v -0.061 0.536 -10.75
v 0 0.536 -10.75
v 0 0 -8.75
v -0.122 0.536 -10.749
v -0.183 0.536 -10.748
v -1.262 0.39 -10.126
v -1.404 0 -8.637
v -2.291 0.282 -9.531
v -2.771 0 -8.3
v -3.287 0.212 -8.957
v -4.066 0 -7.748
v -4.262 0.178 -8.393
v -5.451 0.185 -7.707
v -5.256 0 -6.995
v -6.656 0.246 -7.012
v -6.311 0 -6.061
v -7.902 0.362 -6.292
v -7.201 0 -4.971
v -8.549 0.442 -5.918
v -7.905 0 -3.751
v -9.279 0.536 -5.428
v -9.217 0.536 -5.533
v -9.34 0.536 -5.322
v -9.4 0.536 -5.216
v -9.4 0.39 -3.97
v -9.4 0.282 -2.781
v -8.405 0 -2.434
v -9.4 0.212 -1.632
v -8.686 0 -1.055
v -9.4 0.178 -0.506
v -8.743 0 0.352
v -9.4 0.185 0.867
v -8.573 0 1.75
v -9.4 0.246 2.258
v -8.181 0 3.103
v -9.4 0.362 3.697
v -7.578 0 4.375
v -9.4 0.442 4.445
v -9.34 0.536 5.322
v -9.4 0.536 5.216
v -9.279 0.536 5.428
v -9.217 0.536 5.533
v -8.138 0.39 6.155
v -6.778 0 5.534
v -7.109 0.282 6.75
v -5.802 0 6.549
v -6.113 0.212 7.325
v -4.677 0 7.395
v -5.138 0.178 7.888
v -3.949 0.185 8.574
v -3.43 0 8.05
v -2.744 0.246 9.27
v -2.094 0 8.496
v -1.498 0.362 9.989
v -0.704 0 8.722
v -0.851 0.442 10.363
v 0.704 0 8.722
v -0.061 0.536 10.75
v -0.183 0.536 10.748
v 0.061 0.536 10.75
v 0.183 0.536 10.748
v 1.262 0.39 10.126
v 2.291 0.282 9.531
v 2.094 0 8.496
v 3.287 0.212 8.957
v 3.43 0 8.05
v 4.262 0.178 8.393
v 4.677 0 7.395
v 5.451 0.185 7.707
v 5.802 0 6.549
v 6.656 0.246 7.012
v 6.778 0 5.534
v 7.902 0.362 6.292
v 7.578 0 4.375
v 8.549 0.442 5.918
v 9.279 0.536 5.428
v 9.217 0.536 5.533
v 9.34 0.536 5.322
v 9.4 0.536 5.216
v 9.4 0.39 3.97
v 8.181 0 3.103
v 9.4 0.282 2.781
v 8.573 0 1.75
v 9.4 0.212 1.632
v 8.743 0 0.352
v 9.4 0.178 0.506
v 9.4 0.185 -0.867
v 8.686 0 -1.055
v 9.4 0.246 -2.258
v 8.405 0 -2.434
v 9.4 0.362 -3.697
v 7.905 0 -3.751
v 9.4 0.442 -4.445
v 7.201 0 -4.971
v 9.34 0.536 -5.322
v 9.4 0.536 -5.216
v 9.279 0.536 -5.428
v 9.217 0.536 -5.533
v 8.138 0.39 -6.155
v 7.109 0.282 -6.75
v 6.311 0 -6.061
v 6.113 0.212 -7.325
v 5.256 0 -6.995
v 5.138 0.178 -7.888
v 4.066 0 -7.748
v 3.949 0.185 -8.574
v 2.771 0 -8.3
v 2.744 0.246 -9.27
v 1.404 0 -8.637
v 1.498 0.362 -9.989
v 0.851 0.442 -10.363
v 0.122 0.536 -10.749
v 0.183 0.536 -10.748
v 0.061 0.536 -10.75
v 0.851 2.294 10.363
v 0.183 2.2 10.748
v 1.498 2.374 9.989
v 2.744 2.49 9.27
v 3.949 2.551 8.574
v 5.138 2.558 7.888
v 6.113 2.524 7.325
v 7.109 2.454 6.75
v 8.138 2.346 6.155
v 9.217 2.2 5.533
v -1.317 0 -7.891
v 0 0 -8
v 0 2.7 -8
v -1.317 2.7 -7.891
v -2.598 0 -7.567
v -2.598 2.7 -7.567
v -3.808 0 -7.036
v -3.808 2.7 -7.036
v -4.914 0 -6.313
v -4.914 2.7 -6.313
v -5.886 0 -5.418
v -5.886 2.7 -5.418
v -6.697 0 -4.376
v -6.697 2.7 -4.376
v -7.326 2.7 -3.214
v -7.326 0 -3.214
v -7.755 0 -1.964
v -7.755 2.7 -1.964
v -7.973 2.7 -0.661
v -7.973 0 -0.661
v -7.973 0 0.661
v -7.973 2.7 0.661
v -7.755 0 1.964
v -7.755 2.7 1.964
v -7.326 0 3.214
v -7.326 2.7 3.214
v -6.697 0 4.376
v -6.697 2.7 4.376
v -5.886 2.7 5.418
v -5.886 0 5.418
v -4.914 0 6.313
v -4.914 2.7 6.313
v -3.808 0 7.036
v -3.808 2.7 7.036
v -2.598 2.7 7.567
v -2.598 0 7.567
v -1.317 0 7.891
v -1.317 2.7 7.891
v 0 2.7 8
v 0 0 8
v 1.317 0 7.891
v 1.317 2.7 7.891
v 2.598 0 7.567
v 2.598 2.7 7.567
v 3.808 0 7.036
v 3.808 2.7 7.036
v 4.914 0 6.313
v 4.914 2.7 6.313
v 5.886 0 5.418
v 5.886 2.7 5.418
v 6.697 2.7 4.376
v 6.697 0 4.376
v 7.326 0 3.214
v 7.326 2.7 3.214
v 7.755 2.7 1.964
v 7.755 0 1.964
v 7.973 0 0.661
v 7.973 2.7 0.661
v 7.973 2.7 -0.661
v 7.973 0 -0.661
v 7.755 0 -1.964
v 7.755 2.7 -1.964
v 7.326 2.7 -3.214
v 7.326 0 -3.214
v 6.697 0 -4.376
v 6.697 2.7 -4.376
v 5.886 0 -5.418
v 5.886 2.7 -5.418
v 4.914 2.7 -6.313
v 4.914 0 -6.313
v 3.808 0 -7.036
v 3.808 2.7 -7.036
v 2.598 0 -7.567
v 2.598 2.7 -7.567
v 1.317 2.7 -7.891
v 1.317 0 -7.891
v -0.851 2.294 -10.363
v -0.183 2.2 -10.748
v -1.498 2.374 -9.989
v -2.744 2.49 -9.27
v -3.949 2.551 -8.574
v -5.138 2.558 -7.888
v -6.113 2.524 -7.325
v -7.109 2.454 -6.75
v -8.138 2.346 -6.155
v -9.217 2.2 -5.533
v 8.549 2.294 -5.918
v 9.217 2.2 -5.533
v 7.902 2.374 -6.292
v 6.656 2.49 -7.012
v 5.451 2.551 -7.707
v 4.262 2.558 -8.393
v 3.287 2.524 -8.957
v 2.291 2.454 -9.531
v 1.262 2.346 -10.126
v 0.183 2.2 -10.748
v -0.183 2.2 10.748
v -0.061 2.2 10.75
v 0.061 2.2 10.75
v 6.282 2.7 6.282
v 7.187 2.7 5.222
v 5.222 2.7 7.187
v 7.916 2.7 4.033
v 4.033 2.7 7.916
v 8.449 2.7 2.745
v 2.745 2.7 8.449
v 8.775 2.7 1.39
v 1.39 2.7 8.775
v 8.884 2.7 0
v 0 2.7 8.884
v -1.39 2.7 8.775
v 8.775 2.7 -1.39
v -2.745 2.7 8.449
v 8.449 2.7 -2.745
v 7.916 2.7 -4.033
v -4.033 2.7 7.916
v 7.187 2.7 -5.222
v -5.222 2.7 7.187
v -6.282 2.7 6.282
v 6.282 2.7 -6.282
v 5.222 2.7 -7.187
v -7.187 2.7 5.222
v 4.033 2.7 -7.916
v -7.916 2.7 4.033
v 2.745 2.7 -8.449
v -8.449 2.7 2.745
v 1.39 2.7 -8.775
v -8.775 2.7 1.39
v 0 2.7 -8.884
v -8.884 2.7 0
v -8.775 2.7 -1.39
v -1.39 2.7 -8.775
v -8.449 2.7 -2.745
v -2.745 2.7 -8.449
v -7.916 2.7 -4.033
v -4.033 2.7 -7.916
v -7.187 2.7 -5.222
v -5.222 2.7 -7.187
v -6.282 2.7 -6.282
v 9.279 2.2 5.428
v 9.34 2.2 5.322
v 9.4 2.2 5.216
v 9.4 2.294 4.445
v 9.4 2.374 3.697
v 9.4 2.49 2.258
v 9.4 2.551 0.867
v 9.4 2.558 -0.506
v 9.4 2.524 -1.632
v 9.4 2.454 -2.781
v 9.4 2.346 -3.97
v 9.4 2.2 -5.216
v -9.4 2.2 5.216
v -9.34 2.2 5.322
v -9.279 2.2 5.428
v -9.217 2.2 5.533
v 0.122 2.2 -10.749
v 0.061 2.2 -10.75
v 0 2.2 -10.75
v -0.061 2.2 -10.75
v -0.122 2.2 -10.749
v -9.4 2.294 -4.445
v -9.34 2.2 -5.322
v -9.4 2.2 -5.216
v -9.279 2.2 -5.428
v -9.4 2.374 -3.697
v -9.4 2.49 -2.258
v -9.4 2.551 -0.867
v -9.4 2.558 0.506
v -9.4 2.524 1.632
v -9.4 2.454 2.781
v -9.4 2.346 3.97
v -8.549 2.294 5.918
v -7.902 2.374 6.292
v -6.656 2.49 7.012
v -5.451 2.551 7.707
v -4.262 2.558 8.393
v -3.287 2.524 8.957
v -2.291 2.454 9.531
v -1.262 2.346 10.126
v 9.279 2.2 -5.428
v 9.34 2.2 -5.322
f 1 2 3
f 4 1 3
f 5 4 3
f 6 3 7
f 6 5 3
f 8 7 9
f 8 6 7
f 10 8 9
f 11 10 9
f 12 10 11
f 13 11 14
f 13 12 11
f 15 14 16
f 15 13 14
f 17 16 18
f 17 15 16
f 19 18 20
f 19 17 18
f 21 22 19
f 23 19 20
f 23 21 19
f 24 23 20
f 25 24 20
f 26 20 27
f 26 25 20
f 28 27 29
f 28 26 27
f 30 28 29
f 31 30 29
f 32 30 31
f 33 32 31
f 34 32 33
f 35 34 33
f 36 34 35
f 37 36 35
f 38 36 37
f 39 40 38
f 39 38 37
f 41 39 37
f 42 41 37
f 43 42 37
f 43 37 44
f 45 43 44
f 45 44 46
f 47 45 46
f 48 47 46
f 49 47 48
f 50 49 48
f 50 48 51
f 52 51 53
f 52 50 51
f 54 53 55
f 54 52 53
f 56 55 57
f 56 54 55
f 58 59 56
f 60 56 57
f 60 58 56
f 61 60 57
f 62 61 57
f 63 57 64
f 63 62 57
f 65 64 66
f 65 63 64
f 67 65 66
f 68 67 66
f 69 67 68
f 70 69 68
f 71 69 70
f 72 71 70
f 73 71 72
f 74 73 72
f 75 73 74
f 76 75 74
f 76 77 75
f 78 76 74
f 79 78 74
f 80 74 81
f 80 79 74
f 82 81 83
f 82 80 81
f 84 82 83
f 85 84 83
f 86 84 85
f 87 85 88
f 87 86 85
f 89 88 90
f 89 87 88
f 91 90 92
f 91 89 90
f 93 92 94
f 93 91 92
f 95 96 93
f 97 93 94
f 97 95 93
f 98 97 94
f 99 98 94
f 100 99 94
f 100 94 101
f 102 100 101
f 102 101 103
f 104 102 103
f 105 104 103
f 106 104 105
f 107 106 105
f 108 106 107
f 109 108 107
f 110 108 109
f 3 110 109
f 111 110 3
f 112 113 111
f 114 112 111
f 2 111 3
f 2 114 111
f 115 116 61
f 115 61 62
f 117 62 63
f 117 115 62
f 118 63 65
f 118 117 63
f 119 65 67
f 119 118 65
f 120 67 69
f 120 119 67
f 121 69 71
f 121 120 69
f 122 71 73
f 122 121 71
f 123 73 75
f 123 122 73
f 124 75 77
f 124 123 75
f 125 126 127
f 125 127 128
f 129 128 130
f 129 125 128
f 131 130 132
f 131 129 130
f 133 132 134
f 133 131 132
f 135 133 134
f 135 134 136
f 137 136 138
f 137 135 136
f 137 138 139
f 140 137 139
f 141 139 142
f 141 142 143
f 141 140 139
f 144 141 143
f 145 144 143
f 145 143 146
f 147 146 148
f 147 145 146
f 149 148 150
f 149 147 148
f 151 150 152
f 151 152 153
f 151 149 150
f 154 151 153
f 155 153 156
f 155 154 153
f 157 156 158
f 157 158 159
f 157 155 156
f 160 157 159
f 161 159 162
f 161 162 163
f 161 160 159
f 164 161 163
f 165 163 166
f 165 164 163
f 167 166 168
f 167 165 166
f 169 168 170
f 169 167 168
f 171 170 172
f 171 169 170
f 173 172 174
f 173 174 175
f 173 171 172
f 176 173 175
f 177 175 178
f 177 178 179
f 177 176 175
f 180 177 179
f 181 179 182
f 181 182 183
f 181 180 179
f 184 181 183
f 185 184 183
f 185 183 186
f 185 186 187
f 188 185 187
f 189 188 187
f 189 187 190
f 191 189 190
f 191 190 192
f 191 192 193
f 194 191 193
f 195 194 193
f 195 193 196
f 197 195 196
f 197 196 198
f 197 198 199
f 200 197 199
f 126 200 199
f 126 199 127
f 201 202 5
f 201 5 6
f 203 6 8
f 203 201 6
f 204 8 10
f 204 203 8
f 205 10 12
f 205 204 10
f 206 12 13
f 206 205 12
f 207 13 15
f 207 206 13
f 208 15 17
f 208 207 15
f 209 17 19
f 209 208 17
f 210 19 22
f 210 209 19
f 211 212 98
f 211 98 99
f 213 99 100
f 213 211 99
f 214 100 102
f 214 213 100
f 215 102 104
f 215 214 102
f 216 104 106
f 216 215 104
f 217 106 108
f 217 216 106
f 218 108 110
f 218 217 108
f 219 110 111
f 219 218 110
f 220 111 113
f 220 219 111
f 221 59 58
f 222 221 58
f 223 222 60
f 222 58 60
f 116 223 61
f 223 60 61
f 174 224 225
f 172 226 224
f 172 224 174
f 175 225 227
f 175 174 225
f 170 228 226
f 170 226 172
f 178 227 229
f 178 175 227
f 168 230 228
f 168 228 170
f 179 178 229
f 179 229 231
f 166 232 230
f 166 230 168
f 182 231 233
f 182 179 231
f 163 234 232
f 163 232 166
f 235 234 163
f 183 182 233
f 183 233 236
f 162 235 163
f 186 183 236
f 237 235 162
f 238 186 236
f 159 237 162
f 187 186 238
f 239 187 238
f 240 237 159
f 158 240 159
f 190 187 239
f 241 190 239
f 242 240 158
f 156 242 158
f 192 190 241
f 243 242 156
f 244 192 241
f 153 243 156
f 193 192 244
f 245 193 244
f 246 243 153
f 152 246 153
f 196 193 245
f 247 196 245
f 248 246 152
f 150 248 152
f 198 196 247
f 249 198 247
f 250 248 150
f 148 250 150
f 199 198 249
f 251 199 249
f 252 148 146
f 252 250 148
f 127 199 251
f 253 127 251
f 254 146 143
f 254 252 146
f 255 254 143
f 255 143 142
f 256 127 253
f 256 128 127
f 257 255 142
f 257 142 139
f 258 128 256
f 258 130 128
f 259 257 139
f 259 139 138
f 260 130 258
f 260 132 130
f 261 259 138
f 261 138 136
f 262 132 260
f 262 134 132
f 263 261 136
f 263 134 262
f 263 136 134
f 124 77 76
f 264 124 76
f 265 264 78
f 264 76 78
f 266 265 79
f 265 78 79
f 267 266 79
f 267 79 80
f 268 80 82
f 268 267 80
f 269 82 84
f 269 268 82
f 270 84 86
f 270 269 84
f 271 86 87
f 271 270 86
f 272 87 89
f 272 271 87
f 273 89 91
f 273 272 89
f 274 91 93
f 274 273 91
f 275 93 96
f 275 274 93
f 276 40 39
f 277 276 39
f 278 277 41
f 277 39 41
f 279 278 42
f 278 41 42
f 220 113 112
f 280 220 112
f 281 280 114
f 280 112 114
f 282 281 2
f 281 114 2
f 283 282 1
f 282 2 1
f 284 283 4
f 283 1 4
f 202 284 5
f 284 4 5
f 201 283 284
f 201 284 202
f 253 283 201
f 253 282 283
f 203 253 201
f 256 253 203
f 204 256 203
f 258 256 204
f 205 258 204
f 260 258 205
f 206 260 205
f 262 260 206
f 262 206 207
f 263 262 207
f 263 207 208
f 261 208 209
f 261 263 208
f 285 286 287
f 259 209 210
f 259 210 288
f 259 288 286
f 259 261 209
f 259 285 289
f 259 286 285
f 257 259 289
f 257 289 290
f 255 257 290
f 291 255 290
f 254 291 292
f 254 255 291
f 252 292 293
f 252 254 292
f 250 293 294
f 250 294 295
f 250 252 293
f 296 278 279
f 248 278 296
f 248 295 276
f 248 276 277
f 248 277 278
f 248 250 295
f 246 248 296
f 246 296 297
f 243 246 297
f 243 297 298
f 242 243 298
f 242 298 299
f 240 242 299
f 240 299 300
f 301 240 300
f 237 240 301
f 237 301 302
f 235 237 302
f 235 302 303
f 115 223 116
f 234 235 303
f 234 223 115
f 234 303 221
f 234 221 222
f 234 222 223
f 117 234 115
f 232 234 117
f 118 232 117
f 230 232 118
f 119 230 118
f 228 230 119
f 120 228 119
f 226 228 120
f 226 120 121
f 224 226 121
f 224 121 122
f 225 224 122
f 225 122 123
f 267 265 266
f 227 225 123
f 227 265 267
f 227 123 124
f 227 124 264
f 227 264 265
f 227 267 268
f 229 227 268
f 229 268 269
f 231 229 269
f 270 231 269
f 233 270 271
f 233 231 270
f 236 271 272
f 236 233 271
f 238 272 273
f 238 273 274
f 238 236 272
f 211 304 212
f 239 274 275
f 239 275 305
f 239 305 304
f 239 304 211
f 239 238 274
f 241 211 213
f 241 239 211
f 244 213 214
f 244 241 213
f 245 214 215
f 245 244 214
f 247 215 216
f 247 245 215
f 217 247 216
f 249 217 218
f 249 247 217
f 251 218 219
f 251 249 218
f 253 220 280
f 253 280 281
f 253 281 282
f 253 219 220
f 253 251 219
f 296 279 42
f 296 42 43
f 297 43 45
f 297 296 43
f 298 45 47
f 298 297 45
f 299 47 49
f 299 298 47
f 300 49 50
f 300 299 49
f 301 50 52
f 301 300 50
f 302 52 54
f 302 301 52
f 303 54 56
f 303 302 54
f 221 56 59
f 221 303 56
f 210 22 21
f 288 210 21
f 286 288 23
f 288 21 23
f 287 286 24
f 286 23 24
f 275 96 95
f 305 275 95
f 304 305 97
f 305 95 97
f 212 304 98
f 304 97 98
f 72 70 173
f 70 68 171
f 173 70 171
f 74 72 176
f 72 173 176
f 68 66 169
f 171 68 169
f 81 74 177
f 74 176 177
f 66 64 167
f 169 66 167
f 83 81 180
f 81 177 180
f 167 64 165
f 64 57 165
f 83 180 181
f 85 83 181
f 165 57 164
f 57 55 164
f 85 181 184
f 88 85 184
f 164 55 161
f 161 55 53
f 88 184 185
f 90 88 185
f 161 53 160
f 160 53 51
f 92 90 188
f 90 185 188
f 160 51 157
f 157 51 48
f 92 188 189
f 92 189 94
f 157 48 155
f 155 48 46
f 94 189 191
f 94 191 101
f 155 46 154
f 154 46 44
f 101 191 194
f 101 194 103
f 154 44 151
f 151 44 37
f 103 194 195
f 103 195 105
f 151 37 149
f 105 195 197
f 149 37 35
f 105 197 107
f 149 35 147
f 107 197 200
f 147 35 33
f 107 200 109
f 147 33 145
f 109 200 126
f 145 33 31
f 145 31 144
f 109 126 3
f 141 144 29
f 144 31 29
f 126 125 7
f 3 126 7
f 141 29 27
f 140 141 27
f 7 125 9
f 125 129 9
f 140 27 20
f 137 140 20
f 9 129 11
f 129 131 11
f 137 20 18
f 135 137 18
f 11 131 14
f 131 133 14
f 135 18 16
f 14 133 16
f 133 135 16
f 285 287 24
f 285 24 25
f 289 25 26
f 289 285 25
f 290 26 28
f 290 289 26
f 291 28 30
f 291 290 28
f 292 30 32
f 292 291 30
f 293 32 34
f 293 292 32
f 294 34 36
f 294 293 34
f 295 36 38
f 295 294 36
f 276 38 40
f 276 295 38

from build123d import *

# Parameters (mm, degrees)
SKETCH1_R           = 10.75
SKETCH1_R_2         = 8
BOSS_EXTRUDE1_DEPTH = 2.7
CHAMFER1_SIZE       = 0.5
CHAMFER1_SIZE2      = 1.866025404
CHAMFER2_SIZE       = 2
CHAMFER2_SIZE2      = 0.535898385
SKETCH3_OUTSIDE_W   = 29.606
SKETCH3_OUTSIDE_H   = 29.606
CUT_EXTRUDE1_DEPTH  = 2.7


with BuildPart() as part:
    # Sketch1 → Boss-Extrude1 (new body)
    with BuildSketch(Plane(origin=(0, 0, 0), x_dir=(1, 0, 0), z_dir=(0, 1, 0))):
        with Locations(Location((0, 0, 0), (0, 0, 90))):
            Circle(SKETCH1_R)
        with Locations(Location((0, 0, 0), (0, 0, 90))):
            Circle(SKETCH1_R_2, mode=Mode.SUBTRACT)
    extrude(amount=BOSS_EXTRUDE1_DEPTH)

    # Chamfer1
    chamfer1_edges = [part.edges().sort_by_distance(p)[0] for p in [
        (0, 2.7, 10.75),
    ]]
    chamfer1_side = [part.faces().sort_by_distance(p)[0] for p in [
        (0, 1.35, 10.75),
    ]]
    chamfer(chamfer1_edges, length=CHAMFER1_SIZE, length2=CHAMFER1_SIZE2, reference=chamfer1_side[0])

    # Chamfer2
    chamfer2_edges = [part.edges().sort_by_distance(p)[0] for p in [
        (0, 0, 10.75),
    ]]
    chamfer2_side = [part.faces().sort_by_distance(p)[0] for p in [
        (0, 0, 10.445944084),
    ]]
    chamfer(chamfer2_edges, length=CHAMFER2_SIZE, length2=CHAMFER2_SIZE2, reference=chamfer2_side[0])

    # Sketch3 outside → Cut-Extrude1 (cut)
    with BuildSketch(Plane(origin=(0, 2.7, 0), x_dir=(1, 0, 0), z_dir=(0, 1, 0))):
        Rectangle(SKETCH3_OUTSIDE_W, SKETCH3_OUTSIDE_H)
        Polygon((0, 10.854185061), (-9.4, 5.42709253), (-9.4, -5.42709253), (0, -10.854185061), (9.4, -5.42709253), (9.4, 5.42709253), align=None, mode=Mode.SUBTRACT)
    extrude(amount=-CUT_EXTRUDE1_DEPTH, mode=Mode.SUBTRACT)


solid = part.part
